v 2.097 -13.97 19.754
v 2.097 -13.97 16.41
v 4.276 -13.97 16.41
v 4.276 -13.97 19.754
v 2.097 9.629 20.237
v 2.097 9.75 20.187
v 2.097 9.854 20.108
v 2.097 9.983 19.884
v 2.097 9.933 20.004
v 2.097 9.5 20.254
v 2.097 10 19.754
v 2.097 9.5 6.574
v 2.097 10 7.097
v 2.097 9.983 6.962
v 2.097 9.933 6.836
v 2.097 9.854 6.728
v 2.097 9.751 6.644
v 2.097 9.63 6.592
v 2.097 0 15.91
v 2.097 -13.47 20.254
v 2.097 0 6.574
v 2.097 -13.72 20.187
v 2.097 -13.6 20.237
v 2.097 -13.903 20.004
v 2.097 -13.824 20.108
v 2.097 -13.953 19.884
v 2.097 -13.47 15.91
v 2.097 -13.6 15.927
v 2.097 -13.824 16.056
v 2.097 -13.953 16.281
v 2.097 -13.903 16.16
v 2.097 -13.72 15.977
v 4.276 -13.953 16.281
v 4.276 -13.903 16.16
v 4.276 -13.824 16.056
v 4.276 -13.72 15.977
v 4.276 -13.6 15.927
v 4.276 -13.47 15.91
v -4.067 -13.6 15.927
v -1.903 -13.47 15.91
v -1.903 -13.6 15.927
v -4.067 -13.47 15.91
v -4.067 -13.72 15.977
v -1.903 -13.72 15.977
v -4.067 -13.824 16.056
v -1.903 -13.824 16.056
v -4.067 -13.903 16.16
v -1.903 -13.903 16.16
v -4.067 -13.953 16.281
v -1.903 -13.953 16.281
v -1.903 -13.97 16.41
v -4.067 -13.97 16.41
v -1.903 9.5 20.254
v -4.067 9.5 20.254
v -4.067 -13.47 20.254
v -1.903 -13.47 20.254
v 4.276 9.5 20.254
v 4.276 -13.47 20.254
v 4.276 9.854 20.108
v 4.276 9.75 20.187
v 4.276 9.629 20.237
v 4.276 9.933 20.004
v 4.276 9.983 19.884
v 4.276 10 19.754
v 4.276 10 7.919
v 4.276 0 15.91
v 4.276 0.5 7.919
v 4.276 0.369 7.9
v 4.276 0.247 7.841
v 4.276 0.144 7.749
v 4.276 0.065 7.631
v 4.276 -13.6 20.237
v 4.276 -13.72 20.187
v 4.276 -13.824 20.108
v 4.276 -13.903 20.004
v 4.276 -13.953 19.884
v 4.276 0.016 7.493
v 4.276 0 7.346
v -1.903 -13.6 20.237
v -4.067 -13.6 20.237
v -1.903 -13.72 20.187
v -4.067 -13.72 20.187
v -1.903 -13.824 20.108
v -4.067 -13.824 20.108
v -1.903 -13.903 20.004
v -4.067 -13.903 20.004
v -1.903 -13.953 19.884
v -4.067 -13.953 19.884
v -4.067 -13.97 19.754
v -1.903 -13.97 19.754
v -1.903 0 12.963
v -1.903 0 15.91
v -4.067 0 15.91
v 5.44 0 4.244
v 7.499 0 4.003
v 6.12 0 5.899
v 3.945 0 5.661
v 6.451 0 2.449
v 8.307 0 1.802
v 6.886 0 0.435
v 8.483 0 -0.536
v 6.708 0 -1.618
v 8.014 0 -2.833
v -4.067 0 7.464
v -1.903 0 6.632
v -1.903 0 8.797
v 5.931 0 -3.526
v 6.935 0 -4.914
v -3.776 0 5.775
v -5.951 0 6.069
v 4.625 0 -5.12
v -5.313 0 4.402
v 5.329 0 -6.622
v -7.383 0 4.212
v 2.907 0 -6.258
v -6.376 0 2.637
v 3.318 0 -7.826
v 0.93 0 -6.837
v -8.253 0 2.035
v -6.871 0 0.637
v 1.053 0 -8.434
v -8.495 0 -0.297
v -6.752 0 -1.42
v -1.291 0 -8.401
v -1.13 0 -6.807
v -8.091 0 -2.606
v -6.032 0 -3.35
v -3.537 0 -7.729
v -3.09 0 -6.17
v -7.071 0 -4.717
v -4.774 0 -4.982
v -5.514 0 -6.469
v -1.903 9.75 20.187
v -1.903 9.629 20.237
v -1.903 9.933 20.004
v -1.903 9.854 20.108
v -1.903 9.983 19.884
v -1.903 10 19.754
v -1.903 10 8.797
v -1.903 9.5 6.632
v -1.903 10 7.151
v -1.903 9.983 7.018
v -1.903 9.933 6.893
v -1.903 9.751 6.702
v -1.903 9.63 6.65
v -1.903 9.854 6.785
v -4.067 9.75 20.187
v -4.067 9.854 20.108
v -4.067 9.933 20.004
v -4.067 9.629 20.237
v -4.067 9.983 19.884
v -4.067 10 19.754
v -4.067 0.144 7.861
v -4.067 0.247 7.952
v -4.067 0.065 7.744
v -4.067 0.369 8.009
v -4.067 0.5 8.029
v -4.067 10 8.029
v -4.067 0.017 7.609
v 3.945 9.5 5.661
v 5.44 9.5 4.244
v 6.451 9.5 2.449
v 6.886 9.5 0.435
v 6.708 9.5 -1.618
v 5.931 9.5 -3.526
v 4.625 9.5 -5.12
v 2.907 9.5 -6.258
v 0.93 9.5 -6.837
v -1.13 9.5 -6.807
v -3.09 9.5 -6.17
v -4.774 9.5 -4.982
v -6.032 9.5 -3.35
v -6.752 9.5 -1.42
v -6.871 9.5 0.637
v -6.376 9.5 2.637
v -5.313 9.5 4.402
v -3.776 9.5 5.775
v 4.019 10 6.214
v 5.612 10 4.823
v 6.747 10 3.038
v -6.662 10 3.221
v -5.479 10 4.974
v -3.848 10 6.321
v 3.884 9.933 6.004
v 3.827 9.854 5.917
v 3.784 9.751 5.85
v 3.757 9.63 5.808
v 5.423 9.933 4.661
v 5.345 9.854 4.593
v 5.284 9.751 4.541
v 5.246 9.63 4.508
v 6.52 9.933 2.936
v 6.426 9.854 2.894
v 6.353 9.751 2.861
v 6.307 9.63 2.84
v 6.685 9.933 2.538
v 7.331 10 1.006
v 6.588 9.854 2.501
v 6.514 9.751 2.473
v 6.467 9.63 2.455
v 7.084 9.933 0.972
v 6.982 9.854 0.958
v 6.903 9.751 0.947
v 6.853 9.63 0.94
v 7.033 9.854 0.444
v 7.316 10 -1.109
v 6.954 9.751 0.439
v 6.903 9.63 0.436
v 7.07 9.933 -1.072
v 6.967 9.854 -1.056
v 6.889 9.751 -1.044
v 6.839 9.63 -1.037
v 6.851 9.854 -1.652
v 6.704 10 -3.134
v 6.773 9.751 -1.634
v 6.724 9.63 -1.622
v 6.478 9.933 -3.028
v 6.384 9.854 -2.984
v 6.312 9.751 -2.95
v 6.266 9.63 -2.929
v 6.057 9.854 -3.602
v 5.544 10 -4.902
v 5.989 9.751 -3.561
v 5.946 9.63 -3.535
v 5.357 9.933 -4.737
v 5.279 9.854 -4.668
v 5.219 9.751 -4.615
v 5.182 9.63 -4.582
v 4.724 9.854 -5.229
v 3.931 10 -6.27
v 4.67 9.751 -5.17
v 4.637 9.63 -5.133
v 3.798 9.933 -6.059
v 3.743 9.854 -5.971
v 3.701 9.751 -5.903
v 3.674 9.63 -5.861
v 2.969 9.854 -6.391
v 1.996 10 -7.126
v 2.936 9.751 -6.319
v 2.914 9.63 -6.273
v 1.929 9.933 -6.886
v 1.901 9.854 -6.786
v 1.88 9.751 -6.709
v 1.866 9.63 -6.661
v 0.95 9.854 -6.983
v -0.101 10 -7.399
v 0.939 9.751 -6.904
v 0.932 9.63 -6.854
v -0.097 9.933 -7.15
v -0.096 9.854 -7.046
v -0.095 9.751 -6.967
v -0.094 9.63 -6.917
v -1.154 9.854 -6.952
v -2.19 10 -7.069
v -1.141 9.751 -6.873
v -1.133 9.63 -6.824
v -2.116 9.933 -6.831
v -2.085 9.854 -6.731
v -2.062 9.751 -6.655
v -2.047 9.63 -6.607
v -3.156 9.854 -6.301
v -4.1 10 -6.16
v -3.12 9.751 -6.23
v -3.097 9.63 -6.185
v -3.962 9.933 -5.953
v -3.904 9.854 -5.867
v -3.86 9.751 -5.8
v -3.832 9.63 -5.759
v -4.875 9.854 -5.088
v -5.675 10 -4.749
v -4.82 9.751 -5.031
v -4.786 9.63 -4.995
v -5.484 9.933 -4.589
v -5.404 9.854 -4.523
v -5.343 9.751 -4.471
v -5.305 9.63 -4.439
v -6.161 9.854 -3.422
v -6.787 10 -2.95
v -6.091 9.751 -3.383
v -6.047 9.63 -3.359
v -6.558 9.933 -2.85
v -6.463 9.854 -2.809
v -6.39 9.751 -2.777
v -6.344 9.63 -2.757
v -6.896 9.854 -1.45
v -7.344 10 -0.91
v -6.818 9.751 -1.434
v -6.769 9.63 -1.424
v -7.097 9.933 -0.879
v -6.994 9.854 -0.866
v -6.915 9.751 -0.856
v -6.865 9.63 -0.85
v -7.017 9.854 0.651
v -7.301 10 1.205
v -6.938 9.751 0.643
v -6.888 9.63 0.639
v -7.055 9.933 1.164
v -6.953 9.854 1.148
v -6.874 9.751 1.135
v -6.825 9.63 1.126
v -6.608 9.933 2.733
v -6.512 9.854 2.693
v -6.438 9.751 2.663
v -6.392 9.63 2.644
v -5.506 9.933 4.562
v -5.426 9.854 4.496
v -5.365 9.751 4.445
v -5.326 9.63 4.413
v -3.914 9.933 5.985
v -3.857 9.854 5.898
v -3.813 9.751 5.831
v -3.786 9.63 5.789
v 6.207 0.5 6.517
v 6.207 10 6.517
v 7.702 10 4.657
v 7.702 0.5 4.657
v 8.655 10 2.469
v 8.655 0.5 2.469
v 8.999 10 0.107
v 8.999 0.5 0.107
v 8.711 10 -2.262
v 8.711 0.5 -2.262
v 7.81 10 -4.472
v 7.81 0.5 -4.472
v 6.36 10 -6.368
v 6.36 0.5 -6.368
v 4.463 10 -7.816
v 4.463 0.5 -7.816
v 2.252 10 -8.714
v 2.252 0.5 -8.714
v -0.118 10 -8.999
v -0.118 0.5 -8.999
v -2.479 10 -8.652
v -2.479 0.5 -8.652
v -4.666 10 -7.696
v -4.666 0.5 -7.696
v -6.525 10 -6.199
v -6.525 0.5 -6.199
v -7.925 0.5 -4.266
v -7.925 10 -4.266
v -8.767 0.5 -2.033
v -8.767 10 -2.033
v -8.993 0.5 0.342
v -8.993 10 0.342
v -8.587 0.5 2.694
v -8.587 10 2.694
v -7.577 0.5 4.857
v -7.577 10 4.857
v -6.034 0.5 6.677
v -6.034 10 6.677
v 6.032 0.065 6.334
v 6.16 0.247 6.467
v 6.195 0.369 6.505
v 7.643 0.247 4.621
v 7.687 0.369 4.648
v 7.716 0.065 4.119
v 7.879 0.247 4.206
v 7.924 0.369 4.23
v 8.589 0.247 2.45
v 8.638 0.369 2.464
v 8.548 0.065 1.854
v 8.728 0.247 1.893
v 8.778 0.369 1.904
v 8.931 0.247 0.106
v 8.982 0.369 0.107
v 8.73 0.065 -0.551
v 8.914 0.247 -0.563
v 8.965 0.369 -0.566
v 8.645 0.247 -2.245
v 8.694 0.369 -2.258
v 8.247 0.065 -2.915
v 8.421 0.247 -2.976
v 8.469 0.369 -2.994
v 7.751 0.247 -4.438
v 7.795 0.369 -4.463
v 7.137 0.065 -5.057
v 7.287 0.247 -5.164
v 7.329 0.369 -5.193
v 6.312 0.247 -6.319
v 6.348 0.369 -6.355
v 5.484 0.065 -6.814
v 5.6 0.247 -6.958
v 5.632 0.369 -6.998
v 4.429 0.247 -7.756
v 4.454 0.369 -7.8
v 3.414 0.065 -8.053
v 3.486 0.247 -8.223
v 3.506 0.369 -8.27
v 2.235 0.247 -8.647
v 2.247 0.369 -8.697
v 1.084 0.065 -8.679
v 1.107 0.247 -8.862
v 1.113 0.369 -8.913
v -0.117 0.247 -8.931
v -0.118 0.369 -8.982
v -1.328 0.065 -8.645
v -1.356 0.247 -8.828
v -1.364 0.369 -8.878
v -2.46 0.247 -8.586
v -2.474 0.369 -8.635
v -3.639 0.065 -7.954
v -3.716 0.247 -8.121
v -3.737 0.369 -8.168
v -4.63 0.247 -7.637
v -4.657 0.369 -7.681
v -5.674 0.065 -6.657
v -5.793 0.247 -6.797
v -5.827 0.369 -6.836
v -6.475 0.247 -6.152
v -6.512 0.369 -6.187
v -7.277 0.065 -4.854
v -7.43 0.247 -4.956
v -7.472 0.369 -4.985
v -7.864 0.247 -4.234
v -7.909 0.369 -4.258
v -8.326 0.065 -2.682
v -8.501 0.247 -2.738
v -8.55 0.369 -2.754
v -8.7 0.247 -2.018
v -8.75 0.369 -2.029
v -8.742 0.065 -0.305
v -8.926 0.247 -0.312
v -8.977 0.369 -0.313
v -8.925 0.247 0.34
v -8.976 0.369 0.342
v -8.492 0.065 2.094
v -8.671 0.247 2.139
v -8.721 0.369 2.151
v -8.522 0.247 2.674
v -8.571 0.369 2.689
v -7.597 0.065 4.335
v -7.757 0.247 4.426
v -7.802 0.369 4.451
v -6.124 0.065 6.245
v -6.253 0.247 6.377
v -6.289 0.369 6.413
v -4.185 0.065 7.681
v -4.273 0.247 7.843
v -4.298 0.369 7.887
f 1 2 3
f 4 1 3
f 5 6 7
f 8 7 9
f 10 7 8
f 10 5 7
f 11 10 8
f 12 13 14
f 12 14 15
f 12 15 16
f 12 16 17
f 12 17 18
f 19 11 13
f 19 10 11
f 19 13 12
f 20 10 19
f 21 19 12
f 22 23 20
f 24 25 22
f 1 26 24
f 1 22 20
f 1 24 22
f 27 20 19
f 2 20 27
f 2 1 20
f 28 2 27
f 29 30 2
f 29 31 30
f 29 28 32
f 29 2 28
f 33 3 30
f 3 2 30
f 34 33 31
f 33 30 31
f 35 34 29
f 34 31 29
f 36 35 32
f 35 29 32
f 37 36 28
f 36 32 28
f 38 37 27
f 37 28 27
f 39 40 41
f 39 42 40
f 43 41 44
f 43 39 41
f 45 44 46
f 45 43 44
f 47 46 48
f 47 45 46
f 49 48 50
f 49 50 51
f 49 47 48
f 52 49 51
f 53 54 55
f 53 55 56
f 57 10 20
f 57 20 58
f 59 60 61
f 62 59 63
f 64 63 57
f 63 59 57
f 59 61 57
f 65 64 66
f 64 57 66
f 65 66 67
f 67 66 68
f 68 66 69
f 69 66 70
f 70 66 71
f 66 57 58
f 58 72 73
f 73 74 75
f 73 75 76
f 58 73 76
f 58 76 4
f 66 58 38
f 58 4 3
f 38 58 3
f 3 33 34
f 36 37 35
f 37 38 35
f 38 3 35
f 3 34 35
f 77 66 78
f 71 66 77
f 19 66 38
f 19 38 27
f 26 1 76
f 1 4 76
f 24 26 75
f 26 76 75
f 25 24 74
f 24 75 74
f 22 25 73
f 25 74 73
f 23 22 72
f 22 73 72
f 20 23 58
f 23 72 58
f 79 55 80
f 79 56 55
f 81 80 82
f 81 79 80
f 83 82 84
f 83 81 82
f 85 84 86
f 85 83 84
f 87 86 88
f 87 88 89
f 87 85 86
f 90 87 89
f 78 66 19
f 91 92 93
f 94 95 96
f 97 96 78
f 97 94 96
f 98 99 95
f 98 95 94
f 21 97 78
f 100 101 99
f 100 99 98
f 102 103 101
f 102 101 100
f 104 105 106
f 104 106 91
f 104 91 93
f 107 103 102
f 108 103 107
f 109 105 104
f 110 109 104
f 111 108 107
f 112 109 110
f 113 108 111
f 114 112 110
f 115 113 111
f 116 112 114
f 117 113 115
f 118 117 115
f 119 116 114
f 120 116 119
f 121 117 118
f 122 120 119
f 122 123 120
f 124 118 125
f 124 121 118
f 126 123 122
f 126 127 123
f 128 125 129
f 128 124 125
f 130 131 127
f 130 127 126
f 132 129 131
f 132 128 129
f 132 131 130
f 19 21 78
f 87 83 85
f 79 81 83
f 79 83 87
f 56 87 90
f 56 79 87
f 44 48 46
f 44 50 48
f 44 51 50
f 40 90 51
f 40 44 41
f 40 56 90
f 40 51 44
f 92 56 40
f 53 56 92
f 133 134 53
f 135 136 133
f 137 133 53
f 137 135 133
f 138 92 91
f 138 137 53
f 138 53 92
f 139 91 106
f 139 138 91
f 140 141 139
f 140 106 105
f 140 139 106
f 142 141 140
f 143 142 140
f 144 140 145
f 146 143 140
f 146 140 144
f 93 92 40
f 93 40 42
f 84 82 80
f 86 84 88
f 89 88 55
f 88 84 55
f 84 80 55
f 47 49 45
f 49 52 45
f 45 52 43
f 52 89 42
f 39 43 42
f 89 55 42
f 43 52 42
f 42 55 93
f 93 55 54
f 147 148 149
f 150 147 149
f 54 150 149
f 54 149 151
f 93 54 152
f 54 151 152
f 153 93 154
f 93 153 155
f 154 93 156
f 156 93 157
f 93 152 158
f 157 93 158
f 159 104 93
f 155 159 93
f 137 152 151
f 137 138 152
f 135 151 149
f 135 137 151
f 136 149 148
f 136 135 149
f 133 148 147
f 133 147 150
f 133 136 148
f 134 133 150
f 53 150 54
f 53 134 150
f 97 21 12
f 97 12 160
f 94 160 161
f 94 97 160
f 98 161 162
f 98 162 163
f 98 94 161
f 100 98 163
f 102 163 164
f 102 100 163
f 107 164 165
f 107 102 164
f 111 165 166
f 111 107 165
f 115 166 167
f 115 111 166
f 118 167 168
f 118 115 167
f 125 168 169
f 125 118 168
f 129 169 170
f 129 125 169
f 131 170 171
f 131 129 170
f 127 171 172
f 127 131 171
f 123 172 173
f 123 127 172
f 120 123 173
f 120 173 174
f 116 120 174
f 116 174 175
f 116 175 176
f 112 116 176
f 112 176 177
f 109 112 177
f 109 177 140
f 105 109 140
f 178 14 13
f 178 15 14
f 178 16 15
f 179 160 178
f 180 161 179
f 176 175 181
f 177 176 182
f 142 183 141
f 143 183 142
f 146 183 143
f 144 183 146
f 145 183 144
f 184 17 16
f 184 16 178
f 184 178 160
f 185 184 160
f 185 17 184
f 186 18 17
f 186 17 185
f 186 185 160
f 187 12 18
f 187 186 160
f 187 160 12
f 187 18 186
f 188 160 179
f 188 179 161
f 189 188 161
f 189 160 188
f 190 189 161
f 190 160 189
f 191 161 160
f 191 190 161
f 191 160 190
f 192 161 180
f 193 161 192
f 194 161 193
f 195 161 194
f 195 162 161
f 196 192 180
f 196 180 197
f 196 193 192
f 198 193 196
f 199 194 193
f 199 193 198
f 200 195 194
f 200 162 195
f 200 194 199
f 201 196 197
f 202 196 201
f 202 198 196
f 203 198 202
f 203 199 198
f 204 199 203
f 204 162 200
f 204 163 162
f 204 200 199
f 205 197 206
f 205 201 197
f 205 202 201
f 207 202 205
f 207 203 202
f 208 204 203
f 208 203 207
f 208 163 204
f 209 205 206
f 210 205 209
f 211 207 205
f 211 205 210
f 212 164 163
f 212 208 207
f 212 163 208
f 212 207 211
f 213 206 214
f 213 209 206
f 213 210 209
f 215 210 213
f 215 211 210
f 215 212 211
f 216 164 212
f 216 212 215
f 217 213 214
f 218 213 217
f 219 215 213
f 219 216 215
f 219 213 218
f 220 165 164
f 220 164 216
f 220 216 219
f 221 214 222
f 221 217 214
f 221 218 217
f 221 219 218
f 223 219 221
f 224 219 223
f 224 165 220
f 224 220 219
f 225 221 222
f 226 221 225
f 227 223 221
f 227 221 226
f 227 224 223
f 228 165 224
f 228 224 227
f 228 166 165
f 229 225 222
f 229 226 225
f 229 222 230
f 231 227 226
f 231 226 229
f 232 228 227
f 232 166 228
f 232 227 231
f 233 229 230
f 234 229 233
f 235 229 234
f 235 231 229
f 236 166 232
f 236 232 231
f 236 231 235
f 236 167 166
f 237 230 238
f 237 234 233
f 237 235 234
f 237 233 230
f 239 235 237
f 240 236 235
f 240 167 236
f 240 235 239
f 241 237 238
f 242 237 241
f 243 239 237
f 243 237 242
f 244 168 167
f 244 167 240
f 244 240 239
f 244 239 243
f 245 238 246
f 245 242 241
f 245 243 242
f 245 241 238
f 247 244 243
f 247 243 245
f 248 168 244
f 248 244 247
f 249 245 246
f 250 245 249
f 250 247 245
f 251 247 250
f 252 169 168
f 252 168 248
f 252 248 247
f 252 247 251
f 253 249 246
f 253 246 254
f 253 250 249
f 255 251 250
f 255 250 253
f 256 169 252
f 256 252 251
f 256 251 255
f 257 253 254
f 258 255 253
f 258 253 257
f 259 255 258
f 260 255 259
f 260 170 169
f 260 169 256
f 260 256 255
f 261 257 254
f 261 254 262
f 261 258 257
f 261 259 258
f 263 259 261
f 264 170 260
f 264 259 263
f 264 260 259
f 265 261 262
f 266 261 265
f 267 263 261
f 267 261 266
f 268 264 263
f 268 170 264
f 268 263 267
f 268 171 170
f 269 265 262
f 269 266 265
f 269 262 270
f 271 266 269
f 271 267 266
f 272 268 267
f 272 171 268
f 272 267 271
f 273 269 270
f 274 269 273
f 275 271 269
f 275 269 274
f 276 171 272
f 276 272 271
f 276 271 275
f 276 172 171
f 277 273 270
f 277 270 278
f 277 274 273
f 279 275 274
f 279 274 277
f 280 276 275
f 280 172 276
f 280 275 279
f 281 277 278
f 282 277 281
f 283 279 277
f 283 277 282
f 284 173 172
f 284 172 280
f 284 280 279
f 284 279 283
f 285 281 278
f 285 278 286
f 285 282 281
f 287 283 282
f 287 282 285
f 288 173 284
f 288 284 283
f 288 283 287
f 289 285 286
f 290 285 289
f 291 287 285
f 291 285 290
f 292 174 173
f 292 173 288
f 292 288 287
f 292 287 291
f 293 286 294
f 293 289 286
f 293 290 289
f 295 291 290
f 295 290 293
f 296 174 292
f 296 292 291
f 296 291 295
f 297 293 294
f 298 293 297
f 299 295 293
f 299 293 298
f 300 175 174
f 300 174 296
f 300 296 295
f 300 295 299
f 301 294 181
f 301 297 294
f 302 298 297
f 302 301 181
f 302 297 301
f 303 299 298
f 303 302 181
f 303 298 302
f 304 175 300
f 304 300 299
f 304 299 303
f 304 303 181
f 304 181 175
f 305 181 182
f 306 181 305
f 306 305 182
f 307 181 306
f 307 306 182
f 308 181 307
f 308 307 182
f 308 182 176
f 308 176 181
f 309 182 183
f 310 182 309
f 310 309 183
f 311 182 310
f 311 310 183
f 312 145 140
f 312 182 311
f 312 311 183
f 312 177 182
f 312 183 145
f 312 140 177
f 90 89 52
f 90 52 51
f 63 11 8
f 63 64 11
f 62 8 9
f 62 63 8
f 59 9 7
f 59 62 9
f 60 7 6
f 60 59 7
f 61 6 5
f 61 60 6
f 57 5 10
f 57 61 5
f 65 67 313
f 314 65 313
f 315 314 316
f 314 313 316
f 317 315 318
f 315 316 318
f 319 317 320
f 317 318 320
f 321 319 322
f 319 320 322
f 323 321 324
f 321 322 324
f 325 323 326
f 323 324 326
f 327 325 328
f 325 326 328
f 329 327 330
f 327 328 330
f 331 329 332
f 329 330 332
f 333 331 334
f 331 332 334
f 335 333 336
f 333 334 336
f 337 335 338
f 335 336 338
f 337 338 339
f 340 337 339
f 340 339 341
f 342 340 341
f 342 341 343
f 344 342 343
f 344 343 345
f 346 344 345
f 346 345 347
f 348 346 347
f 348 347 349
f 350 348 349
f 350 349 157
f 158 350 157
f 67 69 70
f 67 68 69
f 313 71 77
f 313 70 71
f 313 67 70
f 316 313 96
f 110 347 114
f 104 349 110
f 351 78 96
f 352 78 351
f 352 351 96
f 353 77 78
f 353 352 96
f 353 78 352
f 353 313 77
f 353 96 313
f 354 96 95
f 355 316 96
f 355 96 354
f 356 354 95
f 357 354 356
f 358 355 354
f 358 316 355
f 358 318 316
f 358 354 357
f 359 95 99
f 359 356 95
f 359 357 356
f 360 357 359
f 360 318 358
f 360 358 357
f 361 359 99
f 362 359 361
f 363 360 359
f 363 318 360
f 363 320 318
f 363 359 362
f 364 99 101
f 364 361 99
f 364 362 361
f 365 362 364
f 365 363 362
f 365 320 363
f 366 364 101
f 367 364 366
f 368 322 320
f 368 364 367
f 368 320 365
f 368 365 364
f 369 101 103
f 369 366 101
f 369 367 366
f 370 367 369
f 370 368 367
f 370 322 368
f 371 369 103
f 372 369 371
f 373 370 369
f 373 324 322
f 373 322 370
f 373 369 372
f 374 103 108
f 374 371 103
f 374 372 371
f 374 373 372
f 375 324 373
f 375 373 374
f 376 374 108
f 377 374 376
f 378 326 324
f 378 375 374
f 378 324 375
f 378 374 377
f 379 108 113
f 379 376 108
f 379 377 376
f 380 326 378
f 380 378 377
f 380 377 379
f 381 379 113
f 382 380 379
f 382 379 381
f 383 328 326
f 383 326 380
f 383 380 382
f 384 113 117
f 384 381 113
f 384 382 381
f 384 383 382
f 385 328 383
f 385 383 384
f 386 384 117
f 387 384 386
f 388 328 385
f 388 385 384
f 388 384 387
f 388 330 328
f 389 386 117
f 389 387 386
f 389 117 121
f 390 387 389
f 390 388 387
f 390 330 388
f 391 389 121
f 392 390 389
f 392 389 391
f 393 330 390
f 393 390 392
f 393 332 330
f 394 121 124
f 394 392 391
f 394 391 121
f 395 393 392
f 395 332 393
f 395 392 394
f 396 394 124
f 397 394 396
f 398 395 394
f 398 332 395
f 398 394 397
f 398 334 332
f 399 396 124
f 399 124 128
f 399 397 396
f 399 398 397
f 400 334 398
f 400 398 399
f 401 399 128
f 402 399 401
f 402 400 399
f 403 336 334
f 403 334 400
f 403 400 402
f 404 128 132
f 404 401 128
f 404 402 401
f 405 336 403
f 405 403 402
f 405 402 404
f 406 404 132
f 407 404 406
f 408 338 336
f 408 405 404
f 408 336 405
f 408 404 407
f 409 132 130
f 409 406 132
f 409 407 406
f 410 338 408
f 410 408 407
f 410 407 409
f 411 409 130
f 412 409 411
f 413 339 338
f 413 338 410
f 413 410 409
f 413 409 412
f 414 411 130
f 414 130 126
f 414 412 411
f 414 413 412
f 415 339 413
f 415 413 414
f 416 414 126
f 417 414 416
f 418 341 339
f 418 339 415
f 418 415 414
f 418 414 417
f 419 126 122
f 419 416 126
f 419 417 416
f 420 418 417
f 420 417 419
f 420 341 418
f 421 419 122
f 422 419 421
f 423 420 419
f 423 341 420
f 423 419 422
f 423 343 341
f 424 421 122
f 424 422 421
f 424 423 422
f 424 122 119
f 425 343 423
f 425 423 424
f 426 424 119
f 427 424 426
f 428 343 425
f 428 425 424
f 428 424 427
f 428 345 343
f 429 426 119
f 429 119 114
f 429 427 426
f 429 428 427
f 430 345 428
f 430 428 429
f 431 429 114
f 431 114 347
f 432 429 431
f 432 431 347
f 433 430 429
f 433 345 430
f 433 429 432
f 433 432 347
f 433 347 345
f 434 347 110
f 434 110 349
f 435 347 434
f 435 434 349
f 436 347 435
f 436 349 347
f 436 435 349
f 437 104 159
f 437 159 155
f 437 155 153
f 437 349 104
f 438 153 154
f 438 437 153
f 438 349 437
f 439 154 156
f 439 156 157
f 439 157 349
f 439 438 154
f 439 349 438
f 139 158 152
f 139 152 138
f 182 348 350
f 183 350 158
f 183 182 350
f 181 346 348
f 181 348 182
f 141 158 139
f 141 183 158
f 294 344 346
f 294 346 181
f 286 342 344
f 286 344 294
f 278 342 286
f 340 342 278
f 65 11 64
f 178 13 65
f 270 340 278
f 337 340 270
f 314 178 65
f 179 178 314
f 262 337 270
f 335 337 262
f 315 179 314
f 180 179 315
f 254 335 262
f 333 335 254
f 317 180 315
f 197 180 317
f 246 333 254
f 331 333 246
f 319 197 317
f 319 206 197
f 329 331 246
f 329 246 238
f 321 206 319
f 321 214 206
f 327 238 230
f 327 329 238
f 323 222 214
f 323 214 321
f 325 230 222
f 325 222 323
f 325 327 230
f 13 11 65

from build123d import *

# Parameters (mm, degrees)
SKETCH1_R           = 9
SKETCH1_R_2         = 6.9
BOSS_EXTRUDE1_DEPTH = 10
SKETCH2_W           = 4
SKETCH2_H           = 7.765292285
CUT_EXTRUDE1_DEPTH  = 14
SKETCH3_W           = 2.178666284
SKETCH3_H           = 14.18086127
SKETCH3_W_2         = 2.164116959
SKETCH3_H_2         = 14.122068743
BOSS_EXTRUDE2_DEPTH = 10
SKETCH4_W           = 2.178666284
SKETCH4_H           = 7.791069301
SKETCH4_W_2         = 2.164116959
BOSS_EXTRUDE3_DEPTH = 18
SKETCH5_W           = 23.023428876
SKETCH5_H           = 2.946570651
CUT_EXTRUDE2_DEPTH  = 18
SKETCH6_R           = 37.134957589
CUT_EXTRUDE3_DEPTH  = 0.5
FILLET1_R           = 0.5
FILLET2_R           = 0.5
FILLET3_R           = 0.5


with BuildPart() as part:
    # Sketch1 → Boss-Extrude1 (new body)
    with BuildSketch(Plane(origin=(0, 0, 0), x_dir=(1, 0, 0), z_dir=(0, 1, 0))):
        with Locations(Location((0, 0, 0), (0, 0, 270))):
            Circle(SKETCH1_R)
        with Locations(Location((0, 0, 0), (0, 0, 270))):
            Circle(SKETCH1_R_2, mode=Mode.SUBTRACT)
    extrude(amount=BOSS_EXTRUDE1_DEPTH)

    # Sketch2 → Cut-Extrude1 (cut)
    with BuildSketch(Plane(origin=(0, 10, 0), x_dir=(1, 0, 0), z_dir=(0, 1, 0))):
        with Locations((0.097051884, -9.080757725)):
            Rectangle(SKETCH2_W, SKETCH2_H)
    extrude(amount=-CUT_EXTRUDE1_DEPTH, mode=Mode.SUBTRACT)

    # Sketch3 → Boss-Extrude2 (add)
    with BuildSketch(Plane(origin=(0, 10, 0), x_dir=(1, 0, 0), z_dir=(0, 1, 0))):
        with Locations((3.186385026, -13.664042534)):
            Rectangle(SKETCH3_W, SKETCH3_H)
        with Locations((-2.985006596, -13.693438798)):
            Rectangle(SKETCH3_W_2, SKETCH3_H_2)
    extrude(amount=-BOSS_EXTRUDE2_DEPTH)

    # Sketch4 → Boss-Extrude3 (add)
    with BuildSketch(Plane(origin=(0, -13.970289025, 0), x_dir=(1, 0, 0), z_dir=(0, 1, 0))):
        with Locations((3.186385026, -16.858938519)):
            Rectangle(SKETCH4_W, SKETCH4_H)
        with Locations((-2.985006596, -16.858938519)):
            Rectangle(SKETCH4_W_2, SKETCH4_H)
    extrude(amount=BOSS_EXTRUDE3_DEPTH)

    # Sketch5 → Cut-Extrude2 (cut)
    with BuildSketch(Plane(origin=(0, 0, 0), x_dir=(-1, 0, 0), z_dir=(0, -1, 0))):
        with Locations((7.23599627, -14.436689194)):
            Rectangle(SKETCH5_W, SKETCH5_H)
    extrude(amount=CUT_EXTRUDE2_DEPTH, mode=Mode.SUBTRACT)

    # Sketch6 → Cut-Extrude3 (cut)
    with BuildSketch(Plane.XY.offset(20.754473169)):
        with Locations((-4.067065075, 10)):
            Circle(SKETCH6_R)
    extrude(amount=-CUT_EXTRUDE3_DEPTH, mode=Mode.SUBTRACT)

    # Fillet1
    fillet1_edges = [part.edges().sort_by_distance(p)[0] for p in [
        (-2.985006595, -13.970289025, 15.909974519),
        (3.186385026, -13.970289025, 15.909974519),
        (3.186385026, 10, 20.254473169),
        (-2.985006595, 10, 20.254473169),
        (3.186385026, -13.970289025, 20.254473169),
        (-2.985006595, -13.970289025, 20.254473169),
    ]]
    fillet(fillet1_edges, radius=FILLET1_R)

    # Fillet2
    fillet2_edges = [part.edges().sort_by_distance(p)[0] for p in [
        (-0.117739094, 0, -8.999229828),
    ]]
    fillet(fillet2_edges, radius=FILLET2_R)

    # Fillet3
    fillet3_edges = [part.edges().sort_by_distance(p)[0] for p in [
        (-0.101406156, 10, -6.8992548),
    ]]
    fillet(fillet3_edges, radius=FILLET3_R)


solid = part.part
